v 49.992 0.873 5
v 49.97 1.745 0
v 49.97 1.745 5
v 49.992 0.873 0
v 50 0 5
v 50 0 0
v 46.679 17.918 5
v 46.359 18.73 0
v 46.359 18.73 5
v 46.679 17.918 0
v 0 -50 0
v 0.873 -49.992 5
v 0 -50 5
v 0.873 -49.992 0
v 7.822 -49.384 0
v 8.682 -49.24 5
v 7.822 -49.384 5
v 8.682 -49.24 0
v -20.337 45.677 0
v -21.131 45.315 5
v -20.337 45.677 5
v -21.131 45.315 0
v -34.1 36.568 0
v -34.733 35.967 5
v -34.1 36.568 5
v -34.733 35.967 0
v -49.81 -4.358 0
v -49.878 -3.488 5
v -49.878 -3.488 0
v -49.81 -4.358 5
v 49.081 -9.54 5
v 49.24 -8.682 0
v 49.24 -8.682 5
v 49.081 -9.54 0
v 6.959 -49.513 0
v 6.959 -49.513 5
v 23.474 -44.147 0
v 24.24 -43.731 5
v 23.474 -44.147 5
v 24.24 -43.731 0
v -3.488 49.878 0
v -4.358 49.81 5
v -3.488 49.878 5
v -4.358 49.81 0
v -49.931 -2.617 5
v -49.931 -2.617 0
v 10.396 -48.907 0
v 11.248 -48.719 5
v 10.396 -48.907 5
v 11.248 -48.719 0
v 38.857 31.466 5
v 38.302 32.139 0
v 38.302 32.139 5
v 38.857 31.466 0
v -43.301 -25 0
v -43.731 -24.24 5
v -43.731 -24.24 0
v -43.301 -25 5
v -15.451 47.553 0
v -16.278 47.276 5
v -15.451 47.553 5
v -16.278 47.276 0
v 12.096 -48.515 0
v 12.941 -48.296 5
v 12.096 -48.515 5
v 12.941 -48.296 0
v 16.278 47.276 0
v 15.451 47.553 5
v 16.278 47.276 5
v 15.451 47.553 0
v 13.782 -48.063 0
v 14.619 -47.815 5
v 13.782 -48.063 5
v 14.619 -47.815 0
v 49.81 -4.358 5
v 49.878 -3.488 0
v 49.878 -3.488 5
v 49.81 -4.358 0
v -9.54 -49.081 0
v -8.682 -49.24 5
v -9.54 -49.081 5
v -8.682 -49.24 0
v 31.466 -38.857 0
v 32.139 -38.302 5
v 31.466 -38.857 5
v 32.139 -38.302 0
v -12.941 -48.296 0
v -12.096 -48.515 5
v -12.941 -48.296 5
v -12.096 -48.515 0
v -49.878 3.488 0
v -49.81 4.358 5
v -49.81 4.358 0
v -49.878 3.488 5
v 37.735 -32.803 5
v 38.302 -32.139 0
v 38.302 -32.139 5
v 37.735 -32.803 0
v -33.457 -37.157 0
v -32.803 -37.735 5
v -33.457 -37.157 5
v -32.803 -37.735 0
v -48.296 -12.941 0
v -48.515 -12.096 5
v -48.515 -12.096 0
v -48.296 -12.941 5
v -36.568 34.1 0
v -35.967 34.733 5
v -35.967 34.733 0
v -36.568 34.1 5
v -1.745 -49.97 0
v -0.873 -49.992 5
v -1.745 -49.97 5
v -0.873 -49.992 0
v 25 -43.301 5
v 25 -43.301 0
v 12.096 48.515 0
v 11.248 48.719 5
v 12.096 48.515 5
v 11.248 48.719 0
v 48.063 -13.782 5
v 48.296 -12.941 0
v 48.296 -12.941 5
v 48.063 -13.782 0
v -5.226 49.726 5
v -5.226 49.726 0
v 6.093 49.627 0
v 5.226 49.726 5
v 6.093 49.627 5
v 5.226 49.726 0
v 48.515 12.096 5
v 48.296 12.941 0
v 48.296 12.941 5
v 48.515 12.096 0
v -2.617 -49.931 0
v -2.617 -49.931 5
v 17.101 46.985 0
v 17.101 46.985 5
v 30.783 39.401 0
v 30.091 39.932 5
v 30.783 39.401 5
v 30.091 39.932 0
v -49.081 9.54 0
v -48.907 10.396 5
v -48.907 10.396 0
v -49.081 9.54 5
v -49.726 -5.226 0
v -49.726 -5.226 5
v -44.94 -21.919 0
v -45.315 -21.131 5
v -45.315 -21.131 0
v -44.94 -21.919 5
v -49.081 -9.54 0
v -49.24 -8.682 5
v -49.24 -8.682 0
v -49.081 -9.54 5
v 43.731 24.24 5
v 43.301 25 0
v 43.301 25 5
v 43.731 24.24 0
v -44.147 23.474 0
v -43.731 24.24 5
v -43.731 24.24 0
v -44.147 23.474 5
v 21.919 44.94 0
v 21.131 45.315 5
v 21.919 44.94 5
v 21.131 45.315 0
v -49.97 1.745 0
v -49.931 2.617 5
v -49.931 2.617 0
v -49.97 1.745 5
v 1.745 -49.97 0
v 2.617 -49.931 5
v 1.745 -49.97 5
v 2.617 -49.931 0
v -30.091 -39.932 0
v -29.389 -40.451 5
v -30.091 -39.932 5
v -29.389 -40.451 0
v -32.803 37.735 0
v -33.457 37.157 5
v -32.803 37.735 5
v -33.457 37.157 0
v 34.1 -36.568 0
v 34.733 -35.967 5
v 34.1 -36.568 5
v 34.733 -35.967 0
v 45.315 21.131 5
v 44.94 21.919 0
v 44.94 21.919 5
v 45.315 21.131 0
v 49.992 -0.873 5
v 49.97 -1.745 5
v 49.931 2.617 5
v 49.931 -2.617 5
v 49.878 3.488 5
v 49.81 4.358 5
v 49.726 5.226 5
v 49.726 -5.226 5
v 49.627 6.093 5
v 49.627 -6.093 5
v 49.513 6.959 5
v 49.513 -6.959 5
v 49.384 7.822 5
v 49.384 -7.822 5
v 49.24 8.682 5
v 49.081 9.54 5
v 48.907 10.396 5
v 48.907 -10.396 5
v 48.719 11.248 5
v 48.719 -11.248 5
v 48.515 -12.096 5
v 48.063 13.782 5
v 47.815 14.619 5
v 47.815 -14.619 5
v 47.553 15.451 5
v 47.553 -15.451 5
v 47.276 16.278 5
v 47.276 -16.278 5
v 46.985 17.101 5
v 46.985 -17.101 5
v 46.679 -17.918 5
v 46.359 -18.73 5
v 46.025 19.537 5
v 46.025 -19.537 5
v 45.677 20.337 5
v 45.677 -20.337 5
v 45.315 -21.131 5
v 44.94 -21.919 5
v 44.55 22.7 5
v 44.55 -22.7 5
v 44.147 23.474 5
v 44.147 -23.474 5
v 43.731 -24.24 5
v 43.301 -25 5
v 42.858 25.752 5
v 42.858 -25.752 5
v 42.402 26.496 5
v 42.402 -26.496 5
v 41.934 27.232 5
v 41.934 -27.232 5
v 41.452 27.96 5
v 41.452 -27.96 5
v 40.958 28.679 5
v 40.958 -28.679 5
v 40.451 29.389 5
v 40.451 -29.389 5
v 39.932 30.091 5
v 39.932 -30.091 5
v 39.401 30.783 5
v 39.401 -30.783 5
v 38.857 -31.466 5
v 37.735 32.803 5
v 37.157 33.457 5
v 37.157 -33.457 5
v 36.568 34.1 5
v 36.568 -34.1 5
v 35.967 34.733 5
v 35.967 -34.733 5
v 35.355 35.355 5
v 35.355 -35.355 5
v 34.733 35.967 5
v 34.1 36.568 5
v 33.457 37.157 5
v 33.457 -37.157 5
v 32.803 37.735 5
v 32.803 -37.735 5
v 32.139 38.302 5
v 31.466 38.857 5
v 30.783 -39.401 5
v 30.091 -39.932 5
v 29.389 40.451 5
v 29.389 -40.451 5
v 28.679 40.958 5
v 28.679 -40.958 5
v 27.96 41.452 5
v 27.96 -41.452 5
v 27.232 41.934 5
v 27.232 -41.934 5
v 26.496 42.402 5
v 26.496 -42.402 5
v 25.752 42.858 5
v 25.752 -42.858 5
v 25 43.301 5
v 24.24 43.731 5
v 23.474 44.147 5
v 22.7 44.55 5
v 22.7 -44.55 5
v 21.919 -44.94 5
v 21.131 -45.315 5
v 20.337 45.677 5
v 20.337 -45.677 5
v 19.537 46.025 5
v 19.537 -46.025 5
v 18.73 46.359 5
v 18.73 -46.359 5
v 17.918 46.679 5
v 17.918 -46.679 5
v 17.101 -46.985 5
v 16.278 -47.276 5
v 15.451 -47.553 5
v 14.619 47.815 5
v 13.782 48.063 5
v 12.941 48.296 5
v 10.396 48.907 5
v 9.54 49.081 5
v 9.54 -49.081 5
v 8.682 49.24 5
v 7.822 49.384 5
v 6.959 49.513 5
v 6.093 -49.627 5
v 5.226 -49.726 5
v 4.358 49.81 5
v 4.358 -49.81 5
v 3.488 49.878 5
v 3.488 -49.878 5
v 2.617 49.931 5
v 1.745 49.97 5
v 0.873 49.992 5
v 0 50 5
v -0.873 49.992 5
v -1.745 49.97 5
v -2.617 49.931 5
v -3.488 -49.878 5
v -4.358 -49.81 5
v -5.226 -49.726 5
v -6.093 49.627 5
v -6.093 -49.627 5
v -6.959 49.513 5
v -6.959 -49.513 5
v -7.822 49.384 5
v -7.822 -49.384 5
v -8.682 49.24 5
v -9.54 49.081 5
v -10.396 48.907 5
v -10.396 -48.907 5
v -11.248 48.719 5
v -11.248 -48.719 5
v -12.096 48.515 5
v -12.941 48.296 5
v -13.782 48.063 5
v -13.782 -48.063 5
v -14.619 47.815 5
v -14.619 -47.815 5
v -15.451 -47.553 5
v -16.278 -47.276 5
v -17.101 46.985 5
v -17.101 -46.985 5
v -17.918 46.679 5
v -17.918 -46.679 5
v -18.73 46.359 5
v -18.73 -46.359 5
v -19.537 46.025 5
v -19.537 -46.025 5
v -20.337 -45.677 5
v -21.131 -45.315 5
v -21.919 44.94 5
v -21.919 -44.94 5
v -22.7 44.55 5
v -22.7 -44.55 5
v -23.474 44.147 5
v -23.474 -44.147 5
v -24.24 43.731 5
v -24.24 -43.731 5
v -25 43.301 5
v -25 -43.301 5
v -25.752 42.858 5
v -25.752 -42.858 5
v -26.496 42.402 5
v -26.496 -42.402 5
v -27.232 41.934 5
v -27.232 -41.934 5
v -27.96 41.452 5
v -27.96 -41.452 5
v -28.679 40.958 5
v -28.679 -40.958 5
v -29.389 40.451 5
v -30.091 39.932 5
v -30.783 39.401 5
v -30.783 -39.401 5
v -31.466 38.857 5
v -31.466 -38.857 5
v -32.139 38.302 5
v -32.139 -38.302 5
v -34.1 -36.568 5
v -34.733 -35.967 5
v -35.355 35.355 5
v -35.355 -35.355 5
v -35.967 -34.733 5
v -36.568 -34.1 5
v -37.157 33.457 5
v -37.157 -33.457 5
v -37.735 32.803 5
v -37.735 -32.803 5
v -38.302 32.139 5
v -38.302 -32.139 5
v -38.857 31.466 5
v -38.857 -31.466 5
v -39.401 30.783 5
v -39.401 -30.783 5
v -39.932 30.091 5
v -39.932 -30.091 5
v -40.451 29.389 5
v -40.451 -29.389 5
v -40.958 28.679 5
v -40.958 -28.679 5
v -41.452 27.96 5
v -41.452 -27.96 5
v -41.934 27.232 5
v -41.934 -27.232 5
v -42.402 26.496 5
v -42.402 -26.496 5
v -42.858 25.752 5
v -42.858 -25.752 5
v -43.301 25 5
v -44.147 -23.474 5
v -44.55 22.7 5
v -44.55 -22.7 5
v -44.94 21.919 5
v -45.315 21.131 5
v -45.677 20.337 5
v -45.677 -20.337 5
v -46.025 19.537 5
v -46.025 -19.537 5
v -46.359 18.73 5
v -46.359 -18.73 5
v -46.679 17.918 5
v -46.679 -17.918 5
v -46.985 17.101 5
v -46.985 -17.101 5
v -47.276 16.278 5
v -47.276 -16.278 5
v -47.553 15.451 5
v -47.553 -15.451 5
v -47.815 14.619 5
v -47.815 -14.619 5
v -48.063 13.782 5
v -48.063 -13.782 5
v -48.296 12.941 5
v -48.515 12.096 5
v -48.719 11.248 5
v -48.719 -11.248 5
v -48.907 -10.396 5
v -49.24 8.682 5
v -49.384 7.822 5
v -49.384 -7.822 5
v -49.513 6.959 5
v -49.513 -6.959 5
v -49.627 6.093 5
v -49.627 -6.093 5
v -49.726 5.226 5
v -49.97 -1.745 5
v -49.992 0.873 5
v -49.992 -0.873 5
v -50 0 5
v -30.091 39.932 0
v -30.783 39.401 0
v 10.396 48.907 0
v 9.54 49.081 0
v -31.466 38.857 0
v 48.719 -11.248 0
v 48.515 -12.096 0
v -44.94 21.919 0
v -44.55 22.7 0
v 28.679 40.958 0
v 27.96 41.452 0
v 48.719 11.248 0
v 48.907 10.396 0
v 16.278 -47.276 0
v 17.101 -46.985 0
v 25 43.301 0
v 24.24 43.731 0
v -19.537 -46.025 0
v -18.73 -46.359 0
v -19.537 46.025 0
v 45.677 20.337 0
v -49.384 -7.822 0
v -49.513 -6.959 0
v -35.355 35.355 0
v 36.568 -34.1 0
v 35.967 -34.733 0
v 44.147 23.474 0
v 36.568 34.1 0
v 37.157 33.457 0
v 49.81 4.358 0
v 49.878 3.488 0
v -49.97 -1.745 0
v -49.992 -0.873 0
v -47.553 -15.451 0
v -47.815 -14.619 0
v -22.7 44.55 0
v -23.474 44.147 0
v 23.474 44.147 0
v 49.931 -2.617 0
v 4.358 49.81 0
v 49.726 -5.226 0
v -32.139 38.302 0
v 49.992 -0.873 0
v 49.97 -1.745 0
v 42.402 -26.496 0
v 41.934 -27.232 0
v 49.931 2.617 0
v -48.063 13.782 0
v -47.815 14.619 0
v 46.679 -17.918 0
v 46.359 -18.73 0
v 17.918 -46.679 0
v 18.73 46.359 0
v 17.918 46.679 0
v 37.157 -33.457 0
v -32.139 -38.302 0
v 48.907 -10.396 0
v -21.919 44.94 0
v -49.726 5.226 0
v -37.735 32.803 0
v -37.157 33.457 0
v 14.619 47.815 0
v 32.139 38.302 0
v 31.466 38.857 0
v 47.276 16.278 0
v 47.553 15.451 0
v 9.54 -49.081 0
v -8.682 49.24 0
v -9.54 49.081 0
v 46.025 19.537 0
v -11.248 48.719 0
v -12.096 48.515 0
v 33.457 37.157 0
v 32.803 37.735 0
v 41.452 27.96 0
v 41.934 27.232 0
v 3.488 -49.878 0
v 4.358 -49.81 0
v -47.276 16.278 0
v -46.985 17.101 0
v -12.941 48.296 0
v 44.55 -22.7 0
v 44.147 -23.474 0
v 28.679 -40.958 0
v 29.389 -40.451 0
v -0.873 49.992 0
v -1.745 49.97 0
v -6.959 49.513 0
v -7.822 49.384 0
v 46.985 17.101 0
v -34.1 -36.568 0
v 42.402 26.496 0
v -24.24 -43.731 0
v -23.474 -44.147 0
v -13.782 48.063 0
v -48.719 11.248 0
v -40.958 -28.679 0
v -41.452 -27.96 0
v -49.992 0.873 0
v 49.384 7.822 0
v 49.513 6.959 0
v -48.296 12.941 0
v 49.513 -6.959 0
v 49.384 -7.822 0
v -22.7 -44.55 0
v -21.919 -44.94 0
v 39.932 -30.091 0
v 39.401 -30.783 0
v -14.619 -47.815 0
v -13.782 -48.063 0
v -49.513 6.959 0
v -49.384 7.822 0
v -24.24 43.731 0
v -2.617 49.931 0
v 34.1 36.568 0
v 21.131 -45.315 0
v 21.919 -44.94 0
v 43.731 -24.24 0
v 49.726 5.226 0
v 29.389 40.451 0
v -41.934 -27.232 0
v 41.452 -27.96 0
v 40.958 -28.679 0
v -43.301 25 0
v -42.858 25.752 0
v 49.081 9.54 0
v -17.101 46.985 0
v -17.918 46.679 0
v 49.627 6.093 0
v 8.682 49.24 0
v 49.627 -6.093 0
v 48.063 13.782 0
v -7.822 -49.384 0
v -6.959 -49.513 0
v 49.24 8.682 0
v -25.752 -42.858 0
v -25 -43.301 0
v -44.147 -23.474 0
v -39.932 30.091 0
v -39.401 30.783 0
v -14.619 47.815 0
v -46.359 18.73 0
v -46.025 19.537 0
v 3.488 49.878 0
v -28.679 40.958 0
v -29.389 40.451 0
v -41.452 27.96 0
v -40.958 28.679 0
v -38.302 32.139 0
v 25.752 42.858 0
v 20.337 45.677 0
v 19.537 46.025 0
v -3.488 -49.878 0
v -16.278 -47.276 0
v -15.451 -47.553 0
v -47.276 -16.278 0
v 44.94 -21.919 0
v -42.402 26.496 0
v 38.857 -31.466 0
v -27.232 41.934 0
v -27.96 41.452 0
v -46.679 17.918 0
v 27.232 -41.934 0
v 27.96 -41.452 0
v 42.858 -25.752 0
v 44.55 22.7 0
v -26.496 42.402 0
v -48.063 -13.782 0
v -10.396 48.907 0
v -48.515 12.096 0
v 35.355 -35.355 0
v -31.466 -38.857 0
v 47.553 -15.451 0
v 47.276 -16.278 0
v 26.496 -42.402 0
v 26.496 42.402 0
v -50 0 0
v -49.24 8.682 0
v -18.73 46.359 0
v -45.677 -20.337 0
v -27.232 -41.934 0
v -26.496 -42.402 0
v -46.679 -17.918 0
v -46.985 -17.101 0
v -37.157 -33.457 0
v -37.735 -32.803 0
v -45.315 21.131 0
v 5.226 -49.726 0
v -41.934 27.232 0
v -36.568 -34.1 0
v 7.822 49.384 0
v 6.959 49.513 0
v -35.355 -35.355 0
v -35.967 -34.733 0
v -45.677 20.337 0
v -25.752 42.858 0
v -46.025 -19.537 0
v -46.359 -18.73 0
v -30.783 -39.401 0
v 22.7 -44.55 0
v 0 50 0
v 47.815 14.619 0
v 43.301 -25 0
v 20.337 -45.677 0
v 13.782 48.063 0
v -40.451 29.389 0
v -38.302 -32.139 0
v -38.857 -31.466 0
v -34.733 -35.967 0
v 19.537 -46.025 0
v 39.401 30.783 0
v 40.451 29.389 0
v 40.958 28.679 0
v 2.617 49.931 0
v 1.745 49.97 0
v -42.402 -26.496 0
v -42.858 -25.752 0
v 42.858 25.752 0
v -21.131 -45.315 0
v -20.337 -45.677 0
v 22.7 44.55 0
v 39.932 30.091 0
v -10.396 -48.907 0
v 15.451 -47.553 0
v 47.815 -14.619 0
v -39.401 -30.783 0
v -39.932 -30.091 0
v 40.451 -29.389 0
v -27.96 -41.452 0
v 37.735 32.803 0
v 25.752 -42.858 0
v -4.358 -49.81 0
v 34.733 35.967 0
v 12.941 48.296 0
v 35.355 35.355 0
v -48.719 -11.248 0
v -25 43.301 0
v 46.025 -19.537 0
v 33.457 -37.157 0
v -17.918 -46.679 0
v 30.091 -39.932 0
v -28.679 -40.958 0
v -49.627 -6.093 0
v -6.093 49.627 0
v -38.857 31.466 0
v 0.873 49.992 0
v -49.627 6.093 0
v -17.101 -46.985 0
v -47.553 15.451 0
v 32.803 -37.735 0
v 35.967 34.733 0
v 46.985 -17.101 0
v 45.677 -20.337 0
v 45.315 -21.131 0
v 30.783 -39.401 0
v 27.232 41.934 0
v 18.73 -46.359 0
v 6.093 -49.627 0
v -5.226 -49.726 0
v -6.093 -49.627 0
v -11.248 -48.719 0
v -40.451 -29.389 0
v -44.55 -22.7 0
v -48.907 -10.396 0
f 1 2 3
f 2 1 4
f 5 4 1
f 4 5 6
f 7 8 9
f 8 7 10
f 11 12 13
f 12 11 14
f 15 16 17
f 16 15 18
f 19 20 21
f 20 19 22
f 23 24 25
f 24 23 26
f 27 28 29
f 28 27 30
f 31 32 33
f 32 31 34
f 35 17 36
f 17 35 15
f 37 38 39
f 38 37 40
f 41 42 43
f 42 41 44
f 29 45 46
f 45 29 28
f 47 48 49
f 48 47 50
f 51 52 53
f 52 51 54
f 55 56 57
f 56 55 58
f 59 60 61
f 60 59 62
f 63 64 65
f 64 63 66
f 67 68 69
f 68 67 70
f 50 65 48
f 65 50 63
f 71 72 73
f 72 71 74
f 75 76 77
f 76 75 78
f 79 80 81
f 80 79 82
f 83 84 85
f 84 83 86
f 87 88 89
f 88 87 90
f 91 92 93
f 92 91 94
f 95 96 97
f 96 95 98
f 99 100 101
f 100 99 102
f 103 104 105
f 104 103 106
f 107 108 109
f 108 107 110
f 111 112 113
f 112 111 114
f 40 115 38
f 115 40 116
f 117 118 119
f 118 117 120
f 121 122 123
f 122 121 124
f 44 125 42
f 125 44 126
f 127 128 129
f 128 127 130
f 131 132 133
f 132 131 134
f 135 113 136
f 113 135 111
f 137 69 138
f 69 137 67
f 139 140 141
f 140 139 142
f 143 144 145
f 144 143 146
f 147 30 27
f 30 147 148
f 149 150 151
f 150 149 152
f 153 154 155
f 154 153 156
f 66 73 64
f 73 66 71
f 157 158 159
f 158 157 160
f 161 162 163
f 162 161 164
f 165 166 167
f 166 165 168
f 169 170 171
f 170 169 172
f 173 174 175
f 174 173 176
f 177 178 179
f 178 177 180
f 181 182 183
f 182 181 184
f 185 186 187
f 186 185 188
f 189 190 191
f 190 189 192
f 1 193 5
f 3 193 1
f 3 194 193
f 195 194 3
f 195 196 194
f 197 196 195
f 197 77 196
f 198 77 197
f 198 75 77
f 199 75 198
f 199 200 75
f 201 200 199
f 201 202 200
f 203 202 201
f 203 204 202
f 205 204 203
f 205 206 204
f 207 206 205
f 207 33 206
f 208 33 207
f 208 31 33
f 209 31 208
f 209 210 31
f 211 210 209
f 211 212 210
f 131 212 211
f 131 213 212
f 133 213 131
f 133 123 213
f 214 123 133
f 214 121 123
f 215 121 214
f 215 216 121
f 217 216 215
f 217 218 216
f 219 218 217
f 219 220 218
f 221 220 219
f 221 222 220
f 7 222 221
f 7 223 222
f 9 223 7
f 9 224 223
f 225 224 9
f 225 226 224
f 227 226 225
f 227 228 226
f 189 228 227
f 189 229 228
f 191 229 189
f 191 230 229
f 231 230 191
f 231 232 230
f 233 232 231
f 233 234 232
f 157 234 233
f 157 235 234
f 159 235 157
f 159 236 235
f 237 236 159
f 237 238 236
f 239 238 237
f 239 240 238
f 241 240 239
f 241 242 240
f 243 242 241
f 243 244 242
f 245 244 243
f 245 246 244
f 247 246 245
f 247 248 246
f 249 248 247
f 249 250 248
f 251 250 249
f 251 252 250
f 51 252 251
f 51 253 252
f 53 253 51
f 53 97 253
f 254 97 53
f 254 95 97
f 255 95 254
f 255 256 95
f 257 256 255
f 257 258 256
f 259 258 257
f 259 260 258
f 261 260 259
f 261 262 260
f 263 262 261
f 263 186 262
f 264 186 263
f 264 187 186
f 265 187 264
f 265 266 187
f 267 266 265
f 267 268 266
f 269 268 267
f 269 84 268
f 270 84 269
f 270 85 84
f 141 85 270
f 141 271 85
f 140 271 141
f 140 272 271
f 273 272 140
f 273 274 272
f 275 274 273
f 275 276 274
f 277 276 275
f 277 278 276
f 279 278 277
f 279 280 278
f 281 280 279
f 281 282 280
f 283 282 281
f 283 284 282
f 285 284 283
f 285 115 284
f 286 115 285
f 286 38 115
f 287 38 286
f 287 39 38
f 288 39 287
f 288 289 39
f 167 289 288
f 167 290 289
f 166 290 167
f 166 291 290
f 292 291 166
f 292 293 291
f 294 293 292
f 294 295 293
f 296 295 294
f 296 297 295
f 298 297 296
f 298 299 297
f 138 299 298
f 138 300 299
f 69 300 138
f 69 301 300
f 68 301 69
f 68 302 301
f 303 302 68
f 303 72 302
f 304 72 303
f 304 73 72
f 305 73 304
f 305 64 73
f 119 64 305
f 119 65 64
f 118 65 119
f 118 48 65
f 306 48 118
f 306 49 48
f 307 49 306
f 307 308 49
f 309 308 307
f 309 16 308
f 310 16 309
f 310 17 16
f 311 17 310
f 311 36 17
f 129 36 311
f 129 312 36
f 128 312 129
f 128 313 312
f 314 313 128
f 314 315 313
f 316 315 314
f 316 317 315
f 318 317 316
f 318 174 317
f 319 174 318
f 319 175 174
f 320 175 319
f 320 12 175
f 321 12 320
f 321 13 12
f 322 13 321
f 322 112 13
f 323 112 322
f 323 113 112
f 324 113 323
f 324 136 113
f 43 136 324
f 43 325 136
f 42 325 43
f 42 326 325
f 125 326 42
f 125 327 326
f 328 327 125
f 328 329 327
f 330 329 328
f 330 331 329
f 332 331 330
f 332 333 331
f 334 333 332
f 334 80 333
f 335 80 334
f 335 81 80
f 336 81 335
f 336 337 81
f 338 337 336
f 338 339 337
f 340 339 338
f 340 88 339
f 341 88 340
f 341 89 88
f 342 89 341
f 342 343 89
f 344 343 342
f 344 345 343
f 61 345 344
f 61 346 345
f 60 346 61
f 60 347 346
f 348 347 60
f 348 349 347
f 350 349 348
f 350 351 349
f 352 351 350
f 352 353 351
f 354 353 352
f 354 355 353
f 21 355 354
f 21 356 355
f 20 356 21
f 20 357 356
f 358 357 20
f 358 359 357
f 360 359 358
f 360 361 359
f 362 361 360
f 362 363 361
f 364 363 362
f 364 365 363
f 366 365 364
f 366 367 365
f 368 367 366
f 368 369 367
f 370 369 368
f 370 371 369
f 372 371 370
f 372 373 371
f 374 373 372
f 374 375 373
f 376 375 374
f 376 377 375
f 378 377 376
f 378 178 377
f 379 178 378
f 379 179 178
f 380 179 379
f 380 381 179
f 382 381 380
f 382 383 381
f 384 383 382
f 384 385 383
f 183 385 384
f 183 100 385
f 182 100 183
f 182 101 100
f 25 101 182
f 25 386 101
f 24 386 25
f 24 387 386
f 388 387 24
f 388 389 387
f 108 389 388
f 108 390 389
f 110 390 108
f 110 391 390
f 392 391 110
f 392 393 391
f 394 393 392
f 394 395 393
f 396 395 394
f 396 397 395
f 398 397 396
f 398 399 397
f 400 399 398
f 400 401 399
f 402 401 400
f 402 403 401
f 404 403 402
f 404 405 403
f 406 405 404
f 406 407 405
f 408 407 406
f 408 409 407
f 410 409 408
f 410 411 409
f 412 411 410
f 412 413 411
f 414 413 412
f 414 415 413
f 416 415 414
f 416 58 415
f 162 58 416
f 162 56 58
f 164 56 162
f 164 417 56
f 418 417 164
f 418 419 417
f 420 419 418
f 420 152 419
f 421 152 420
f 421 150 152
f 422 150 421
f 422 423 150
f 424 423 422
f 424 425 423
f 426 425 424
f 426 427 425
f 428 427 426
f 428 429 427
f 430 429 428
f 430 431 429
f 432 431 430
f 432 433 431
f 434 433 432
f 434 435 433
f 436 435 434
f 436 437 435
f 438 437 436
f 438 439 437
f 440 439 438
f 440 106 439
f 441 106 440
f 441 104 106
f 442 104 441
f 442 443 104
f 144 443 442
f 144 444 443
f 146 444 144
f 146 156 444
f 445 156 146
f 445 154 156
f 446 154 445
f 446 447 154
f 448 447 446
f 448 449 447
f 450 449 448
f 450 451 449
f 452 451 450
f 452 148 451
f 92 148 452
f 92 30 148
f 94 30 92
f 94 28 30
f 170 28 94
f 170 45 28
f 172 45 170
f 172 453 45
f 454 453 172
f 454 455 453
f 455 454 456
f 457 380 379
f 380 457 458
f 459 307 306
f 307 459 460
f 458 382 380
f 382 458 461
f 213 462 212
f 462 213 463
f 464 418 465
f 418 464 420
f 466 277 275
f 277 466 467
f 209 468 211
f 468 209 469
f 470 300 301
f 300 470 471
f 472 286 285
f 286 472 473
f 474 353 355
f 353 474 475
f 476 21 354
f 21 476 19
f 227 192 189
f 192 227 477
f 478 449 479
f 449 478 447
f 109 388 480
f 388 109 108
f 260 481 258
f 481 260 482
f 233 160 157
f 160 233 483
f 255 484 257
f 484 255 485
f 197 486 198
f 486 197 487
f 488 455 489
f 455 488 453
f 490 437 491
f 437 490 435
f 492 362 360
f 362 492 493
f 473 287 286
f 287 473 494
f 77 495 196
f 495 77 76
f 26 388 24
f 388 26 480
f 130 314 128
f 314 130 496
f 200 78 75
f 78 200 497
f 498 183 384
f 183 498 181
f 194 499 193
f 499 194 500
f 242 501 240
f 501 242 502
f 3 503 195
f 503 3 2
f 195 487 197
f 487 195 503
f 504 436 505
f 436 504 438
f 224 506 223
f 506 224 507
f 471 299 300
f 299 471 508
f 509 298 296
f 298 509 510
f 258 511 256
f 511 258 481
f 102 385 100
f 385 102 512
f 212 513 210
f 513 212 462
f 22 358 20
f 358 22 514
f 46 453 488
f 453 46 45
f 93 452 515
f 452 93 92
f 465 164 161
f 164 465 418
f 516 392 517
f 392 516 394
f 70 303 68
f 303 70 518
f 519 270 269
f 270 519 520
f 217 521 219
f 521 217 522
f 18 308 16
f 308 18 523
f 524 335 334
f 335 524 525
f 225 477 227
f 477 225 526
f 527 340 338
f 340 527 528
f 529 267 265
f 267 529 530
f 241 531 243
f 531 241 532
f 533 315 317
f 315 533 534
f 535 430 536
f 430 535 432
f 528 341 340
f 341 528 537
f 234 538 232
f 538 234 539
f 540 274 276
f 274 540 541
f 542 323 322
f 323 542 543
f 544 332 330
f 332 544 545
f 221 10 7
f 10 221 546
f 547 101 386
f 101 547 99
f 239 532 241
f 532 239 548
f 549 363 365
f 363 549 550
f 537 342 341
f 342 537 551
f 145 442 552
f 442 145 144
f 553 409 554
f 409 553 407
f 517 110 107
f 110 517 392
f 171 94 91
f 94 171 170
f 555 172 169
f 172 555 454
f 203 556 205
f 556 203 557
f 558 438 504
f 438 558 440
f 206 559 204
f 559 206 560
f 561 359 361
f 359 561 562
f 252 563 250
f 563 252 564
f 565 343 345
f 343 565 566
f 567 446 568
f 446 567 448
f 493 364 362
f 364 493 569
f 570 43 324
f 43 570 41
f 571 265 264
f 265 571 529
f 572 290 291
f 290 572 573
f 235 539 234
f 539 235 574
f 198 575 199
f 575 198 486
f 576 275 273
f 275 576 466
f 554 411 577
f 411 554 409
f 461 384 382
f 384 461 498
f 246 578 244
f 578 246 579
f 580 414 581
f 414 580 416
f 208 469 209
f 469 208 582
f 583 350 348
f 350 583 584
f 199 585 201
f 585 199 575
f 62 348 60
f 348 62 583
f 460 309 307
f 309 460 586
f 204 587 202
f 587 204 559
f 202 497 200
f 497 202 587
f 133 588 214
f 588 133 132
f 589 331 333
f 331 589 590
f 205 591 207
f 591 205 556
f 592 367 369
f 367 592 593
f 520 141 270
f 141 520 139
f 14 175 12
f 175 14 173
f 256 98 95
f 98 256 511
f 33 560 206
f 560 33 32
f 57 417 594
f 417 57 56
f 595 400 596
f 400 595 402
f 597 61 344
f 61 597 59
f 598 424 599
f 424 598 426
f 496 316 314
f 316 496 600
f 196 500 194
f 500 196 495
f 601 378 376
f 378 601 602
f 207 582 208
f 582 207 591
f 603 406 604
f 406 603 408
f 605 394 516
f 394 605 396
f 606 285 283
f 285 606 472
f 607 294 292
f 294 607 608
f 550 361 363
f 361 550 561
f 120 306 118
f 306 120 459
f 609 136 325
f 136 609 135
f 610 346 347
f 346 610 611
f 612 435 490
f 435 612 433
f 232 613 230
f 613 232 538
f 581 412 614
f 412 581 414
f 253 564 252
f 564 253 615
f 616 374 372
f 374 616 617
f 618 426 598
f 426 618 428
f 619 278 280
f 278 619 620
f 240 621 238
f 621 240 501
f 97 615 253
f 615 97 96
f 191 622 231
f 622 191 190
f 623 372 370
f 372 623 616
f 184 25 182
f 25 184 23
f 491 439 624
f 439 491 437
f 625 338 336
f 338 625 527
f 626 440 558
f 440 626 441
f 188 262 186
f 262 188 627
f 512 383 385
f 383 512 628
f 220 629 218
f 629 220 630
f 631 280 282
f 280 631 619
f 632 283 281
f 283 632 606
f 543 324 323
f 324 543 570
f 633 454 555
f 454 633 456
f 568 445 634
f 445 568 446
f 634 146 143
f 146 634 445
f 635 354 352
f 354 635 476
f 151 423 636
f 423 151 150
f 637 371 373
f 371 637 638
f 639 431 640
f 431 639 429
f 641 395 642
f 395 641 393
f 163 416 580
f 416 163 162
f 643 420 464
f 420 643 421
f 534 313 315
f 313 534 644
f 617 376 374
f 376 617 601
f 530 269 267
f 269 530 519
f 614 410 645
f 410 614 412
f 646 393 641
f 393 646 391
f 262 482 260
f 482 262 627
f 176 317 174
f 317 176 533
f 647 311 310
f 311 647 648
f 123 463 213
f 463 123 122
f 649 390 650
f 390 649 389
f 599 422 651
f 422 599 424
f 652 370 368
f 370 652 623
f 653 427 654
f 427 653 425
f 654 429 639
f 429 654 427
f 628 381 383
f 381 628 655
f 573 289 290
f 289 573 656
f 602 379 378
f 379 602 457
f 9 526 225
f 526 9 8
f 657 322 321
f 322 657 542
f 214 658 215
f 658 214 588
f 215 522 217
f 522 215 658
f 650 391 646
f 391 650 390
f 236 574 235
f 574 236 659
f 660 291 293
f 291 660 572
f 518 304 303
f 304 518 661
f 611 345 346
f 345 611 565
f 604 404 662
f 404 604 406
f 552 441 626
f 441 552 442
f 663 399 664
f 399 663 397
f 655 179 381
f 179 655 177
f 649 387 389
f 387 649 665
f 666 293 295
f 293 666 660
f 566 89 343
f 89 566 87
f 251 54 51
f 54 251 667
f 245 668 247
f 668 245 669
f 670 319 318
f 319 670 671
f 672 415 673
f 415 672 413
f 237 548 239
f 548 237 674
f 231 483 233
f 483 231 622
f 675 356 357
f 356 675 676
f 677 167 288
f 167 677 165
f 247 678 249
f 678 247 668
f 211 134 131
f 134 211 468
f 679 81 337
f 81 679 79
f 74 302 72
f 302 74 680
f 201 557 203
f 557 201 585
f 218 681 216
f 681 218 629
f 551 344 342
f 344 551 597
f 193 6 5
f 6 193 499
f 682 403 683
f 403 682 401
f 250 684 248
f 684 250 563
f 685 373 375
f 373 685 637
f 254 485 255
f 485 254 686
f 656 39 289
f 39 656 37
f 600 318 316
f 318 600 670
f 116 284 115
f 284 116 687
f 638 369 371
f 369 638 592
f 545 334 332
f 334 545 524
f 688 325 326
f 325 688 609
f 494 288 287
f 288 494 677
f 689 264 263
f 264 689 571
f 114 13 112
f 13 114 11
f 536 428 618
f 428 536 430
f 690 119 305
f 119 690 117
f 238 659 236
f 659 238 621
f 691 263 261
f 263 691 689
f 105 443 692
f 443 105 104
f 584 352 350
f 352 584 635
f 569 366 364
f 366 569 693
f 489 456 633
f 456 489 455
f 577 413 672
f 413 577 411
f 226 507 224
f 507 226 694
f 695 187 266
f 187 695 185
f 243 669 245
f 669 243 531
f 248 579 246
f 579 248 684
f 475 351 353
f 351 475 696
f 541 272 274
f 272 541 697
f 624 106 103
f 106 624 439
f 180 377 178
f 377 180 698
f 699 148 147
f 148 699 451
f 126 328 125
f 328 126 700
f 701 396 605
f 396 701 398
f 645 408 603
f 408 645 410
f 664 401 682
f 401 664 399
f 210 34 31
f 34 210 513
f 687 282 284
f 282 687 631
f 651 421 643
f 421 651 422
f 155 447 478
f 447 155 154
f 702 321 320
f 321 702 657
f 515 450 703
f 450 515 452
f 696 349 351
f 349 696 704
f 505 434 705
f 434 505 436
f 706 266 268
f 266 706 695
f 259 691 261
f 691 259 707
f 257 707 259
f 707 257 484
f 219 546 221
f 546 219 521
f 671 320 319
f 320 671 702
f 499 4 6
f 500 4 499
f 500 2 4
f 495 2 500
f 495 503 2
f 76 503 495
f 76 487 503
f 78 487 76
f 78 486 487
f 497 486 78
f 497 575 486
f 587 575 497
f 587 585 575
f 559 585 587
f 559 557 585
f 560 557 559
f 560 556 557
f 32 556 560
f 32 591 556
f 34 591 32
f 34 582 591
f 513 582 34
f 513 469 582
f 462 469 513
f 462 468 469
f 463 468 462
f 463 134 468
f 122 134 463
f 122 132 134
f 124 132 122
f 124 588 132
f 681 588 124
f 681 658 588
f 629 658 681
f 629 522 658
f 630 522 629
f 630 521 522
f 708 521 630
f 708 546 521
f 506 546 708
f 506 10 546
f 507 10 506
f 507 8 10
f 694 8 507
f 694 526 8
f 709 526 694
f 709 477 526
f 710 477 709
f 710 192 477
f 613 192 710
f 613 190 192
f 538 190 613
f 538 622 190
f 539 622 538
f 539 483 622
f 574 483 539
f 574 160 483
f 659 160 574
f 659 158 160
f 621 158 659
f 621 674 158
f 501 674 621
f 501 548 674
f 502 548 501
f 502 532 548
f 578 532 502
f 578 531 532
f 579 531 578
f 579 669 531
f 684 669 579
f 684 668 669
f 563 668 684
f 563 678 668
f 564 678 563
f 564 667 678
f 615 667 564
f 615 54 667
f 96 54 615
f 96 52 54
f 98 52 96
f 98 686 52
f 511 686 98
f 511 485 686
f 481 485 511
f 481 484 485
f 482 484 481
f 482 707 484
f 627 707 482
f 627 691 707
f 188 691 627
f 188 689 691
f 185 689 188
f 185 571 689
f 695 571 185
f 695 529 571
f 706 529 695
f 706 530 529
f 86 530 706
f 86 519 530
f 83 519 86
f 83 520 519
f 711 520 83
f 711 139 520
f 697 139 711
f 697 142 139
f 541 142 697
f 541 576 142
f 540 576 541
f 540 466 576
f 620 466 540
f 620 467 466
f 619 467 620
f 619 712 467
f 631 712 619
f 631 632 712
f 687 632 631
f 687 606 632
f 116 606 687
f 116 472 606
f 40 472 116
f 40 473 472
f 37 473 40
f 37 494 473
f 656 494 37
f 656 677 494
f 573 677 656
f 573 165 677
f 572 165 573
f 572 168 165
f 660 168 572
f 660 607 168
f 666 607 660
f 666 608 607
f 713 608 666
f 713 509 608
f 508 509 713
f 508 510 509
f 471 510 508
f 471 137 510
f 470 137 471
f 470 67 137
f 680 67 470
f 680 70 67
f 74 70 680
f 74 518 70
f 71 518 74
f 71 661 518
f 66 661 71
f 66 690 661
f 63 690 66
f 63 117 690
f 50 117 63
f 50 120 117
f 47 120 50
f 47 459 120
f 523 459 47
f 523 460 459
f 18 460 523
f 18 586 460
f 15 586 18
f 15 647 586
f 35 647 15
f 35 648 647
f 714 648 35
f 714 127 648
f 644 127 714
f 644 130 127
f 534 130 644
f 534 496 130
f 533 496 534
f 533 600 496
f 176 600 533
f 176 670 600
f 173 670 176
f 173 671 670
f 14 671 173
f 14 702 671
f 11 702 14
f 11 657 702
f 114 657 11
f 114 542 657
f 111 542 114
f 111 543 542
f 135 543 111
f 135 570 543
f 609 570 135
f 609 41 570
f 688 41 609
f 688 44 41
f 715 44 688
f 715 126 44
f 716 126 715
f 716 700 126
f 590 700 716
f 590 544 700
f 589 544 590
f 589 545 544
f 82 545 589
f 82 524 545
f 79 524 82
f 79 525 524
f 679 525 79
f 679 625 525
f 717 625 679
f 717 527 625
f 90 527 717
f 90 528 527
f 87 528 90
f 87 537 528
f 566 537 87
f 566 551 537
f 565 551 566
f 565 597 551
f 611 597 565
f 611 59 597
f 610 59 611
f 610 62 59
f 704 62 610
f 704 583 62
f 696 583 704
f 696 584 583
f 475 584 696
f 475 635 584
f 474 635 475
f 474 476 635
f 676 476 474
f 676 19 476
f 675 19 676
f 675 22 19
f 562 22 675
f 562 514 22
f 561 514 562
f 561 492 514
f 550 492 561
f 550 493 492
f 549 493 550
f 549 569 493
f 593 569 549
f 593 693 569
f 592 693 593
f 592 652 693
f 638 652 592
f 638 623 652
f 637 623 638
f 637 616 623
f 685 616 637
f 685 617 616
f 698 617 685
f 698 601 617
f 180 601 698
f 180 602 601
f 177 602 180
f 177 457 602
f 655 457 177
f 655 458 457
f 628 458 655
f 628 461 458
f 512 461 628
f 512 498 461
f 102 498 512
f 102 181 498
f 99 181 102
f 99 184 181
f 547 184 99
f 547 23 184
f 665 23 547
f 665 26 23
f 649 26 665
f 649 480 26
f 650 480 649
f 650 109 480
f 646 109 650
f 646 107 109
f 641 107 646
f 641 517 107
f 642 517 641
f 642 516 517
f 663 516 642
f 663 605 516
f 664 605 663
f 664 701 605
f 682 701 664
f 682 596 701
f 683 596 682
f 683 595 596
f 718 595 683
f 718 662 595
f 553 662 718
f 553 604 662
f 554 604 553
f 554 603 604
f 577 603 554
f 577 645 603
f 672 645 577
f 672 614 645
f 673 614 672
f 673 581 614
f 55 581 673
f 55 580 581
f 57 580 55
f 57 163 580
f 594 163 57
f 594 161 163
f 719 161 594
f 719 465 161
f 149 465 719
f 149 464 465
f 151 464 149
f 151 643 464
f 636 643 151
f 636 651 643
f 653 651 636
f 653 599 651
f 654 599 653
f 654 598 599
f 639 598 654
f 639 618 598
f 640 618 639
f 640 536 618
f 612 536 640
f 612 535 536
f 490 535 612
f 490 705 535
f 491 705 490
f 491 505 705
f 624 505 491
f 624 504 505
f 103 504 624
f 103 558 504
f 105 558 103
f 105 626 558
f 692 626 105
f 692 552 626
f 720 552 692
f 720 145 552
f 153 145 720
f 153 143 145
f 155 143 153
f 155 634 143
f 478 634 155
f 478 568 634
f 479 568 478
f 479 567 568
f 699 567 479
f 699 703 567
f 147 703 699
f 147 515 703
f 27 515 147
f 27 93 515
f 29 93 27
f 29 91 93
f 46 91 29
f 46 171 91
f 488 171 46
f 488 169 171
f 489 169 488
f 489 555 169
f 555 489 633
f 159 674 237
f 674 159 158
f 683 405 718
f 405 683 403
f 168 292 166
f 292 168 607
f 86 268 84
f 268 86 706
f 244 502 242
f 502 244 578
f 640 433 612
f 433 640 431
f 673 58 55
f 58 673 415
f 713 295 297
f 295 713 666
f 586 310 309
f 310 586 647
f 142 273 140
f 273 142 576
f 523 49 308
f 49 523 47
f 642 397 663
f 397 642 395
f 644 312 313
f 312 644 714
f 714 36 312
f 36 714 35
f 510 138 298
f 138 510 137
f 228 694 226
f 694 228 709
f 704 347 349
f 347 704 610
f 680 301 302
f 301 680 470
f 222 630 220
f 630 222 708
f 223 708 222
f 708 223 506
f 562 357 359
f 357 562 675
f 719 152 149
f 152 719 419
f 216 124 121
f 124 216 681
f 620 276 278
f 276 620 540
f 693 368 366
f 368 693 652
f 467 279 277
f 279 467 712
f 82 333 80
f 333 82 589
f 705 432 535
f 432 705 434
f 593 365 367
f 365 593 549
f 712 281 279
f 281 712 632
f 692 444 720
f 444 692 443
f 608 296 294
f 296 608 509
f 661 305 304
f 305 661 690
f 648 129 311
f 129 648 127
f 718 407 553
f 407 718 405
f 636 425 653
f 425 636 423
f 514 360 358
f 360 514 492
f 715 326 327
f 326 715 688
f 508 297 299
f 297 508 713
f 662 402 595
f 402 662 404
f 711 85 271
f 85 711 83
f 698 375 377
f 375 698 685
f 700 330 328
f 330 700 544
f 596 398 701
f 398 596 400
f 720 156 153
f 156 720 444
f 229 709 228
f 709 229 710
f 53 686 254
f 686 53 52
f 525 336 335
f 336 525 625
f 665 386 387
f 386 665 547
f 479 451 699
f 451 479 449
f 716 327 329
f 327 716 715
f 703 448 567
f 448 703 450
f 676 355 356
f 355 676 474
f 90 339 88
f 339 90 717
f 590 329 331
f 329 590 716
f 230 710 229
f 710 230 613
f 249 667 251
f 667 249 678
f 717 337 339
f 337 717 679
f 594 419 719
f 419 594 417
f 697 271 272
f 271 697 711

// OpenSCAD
$fn=360;

difference(){
    cylinder(r=50, h=5);
    translate([-37.5,-37.5,5]){
        scale([75/350,75/350,0.01]){
            surface(file="/home/vagrant/openscad/images/qr.png", invert=true);
        } 
    }
}
